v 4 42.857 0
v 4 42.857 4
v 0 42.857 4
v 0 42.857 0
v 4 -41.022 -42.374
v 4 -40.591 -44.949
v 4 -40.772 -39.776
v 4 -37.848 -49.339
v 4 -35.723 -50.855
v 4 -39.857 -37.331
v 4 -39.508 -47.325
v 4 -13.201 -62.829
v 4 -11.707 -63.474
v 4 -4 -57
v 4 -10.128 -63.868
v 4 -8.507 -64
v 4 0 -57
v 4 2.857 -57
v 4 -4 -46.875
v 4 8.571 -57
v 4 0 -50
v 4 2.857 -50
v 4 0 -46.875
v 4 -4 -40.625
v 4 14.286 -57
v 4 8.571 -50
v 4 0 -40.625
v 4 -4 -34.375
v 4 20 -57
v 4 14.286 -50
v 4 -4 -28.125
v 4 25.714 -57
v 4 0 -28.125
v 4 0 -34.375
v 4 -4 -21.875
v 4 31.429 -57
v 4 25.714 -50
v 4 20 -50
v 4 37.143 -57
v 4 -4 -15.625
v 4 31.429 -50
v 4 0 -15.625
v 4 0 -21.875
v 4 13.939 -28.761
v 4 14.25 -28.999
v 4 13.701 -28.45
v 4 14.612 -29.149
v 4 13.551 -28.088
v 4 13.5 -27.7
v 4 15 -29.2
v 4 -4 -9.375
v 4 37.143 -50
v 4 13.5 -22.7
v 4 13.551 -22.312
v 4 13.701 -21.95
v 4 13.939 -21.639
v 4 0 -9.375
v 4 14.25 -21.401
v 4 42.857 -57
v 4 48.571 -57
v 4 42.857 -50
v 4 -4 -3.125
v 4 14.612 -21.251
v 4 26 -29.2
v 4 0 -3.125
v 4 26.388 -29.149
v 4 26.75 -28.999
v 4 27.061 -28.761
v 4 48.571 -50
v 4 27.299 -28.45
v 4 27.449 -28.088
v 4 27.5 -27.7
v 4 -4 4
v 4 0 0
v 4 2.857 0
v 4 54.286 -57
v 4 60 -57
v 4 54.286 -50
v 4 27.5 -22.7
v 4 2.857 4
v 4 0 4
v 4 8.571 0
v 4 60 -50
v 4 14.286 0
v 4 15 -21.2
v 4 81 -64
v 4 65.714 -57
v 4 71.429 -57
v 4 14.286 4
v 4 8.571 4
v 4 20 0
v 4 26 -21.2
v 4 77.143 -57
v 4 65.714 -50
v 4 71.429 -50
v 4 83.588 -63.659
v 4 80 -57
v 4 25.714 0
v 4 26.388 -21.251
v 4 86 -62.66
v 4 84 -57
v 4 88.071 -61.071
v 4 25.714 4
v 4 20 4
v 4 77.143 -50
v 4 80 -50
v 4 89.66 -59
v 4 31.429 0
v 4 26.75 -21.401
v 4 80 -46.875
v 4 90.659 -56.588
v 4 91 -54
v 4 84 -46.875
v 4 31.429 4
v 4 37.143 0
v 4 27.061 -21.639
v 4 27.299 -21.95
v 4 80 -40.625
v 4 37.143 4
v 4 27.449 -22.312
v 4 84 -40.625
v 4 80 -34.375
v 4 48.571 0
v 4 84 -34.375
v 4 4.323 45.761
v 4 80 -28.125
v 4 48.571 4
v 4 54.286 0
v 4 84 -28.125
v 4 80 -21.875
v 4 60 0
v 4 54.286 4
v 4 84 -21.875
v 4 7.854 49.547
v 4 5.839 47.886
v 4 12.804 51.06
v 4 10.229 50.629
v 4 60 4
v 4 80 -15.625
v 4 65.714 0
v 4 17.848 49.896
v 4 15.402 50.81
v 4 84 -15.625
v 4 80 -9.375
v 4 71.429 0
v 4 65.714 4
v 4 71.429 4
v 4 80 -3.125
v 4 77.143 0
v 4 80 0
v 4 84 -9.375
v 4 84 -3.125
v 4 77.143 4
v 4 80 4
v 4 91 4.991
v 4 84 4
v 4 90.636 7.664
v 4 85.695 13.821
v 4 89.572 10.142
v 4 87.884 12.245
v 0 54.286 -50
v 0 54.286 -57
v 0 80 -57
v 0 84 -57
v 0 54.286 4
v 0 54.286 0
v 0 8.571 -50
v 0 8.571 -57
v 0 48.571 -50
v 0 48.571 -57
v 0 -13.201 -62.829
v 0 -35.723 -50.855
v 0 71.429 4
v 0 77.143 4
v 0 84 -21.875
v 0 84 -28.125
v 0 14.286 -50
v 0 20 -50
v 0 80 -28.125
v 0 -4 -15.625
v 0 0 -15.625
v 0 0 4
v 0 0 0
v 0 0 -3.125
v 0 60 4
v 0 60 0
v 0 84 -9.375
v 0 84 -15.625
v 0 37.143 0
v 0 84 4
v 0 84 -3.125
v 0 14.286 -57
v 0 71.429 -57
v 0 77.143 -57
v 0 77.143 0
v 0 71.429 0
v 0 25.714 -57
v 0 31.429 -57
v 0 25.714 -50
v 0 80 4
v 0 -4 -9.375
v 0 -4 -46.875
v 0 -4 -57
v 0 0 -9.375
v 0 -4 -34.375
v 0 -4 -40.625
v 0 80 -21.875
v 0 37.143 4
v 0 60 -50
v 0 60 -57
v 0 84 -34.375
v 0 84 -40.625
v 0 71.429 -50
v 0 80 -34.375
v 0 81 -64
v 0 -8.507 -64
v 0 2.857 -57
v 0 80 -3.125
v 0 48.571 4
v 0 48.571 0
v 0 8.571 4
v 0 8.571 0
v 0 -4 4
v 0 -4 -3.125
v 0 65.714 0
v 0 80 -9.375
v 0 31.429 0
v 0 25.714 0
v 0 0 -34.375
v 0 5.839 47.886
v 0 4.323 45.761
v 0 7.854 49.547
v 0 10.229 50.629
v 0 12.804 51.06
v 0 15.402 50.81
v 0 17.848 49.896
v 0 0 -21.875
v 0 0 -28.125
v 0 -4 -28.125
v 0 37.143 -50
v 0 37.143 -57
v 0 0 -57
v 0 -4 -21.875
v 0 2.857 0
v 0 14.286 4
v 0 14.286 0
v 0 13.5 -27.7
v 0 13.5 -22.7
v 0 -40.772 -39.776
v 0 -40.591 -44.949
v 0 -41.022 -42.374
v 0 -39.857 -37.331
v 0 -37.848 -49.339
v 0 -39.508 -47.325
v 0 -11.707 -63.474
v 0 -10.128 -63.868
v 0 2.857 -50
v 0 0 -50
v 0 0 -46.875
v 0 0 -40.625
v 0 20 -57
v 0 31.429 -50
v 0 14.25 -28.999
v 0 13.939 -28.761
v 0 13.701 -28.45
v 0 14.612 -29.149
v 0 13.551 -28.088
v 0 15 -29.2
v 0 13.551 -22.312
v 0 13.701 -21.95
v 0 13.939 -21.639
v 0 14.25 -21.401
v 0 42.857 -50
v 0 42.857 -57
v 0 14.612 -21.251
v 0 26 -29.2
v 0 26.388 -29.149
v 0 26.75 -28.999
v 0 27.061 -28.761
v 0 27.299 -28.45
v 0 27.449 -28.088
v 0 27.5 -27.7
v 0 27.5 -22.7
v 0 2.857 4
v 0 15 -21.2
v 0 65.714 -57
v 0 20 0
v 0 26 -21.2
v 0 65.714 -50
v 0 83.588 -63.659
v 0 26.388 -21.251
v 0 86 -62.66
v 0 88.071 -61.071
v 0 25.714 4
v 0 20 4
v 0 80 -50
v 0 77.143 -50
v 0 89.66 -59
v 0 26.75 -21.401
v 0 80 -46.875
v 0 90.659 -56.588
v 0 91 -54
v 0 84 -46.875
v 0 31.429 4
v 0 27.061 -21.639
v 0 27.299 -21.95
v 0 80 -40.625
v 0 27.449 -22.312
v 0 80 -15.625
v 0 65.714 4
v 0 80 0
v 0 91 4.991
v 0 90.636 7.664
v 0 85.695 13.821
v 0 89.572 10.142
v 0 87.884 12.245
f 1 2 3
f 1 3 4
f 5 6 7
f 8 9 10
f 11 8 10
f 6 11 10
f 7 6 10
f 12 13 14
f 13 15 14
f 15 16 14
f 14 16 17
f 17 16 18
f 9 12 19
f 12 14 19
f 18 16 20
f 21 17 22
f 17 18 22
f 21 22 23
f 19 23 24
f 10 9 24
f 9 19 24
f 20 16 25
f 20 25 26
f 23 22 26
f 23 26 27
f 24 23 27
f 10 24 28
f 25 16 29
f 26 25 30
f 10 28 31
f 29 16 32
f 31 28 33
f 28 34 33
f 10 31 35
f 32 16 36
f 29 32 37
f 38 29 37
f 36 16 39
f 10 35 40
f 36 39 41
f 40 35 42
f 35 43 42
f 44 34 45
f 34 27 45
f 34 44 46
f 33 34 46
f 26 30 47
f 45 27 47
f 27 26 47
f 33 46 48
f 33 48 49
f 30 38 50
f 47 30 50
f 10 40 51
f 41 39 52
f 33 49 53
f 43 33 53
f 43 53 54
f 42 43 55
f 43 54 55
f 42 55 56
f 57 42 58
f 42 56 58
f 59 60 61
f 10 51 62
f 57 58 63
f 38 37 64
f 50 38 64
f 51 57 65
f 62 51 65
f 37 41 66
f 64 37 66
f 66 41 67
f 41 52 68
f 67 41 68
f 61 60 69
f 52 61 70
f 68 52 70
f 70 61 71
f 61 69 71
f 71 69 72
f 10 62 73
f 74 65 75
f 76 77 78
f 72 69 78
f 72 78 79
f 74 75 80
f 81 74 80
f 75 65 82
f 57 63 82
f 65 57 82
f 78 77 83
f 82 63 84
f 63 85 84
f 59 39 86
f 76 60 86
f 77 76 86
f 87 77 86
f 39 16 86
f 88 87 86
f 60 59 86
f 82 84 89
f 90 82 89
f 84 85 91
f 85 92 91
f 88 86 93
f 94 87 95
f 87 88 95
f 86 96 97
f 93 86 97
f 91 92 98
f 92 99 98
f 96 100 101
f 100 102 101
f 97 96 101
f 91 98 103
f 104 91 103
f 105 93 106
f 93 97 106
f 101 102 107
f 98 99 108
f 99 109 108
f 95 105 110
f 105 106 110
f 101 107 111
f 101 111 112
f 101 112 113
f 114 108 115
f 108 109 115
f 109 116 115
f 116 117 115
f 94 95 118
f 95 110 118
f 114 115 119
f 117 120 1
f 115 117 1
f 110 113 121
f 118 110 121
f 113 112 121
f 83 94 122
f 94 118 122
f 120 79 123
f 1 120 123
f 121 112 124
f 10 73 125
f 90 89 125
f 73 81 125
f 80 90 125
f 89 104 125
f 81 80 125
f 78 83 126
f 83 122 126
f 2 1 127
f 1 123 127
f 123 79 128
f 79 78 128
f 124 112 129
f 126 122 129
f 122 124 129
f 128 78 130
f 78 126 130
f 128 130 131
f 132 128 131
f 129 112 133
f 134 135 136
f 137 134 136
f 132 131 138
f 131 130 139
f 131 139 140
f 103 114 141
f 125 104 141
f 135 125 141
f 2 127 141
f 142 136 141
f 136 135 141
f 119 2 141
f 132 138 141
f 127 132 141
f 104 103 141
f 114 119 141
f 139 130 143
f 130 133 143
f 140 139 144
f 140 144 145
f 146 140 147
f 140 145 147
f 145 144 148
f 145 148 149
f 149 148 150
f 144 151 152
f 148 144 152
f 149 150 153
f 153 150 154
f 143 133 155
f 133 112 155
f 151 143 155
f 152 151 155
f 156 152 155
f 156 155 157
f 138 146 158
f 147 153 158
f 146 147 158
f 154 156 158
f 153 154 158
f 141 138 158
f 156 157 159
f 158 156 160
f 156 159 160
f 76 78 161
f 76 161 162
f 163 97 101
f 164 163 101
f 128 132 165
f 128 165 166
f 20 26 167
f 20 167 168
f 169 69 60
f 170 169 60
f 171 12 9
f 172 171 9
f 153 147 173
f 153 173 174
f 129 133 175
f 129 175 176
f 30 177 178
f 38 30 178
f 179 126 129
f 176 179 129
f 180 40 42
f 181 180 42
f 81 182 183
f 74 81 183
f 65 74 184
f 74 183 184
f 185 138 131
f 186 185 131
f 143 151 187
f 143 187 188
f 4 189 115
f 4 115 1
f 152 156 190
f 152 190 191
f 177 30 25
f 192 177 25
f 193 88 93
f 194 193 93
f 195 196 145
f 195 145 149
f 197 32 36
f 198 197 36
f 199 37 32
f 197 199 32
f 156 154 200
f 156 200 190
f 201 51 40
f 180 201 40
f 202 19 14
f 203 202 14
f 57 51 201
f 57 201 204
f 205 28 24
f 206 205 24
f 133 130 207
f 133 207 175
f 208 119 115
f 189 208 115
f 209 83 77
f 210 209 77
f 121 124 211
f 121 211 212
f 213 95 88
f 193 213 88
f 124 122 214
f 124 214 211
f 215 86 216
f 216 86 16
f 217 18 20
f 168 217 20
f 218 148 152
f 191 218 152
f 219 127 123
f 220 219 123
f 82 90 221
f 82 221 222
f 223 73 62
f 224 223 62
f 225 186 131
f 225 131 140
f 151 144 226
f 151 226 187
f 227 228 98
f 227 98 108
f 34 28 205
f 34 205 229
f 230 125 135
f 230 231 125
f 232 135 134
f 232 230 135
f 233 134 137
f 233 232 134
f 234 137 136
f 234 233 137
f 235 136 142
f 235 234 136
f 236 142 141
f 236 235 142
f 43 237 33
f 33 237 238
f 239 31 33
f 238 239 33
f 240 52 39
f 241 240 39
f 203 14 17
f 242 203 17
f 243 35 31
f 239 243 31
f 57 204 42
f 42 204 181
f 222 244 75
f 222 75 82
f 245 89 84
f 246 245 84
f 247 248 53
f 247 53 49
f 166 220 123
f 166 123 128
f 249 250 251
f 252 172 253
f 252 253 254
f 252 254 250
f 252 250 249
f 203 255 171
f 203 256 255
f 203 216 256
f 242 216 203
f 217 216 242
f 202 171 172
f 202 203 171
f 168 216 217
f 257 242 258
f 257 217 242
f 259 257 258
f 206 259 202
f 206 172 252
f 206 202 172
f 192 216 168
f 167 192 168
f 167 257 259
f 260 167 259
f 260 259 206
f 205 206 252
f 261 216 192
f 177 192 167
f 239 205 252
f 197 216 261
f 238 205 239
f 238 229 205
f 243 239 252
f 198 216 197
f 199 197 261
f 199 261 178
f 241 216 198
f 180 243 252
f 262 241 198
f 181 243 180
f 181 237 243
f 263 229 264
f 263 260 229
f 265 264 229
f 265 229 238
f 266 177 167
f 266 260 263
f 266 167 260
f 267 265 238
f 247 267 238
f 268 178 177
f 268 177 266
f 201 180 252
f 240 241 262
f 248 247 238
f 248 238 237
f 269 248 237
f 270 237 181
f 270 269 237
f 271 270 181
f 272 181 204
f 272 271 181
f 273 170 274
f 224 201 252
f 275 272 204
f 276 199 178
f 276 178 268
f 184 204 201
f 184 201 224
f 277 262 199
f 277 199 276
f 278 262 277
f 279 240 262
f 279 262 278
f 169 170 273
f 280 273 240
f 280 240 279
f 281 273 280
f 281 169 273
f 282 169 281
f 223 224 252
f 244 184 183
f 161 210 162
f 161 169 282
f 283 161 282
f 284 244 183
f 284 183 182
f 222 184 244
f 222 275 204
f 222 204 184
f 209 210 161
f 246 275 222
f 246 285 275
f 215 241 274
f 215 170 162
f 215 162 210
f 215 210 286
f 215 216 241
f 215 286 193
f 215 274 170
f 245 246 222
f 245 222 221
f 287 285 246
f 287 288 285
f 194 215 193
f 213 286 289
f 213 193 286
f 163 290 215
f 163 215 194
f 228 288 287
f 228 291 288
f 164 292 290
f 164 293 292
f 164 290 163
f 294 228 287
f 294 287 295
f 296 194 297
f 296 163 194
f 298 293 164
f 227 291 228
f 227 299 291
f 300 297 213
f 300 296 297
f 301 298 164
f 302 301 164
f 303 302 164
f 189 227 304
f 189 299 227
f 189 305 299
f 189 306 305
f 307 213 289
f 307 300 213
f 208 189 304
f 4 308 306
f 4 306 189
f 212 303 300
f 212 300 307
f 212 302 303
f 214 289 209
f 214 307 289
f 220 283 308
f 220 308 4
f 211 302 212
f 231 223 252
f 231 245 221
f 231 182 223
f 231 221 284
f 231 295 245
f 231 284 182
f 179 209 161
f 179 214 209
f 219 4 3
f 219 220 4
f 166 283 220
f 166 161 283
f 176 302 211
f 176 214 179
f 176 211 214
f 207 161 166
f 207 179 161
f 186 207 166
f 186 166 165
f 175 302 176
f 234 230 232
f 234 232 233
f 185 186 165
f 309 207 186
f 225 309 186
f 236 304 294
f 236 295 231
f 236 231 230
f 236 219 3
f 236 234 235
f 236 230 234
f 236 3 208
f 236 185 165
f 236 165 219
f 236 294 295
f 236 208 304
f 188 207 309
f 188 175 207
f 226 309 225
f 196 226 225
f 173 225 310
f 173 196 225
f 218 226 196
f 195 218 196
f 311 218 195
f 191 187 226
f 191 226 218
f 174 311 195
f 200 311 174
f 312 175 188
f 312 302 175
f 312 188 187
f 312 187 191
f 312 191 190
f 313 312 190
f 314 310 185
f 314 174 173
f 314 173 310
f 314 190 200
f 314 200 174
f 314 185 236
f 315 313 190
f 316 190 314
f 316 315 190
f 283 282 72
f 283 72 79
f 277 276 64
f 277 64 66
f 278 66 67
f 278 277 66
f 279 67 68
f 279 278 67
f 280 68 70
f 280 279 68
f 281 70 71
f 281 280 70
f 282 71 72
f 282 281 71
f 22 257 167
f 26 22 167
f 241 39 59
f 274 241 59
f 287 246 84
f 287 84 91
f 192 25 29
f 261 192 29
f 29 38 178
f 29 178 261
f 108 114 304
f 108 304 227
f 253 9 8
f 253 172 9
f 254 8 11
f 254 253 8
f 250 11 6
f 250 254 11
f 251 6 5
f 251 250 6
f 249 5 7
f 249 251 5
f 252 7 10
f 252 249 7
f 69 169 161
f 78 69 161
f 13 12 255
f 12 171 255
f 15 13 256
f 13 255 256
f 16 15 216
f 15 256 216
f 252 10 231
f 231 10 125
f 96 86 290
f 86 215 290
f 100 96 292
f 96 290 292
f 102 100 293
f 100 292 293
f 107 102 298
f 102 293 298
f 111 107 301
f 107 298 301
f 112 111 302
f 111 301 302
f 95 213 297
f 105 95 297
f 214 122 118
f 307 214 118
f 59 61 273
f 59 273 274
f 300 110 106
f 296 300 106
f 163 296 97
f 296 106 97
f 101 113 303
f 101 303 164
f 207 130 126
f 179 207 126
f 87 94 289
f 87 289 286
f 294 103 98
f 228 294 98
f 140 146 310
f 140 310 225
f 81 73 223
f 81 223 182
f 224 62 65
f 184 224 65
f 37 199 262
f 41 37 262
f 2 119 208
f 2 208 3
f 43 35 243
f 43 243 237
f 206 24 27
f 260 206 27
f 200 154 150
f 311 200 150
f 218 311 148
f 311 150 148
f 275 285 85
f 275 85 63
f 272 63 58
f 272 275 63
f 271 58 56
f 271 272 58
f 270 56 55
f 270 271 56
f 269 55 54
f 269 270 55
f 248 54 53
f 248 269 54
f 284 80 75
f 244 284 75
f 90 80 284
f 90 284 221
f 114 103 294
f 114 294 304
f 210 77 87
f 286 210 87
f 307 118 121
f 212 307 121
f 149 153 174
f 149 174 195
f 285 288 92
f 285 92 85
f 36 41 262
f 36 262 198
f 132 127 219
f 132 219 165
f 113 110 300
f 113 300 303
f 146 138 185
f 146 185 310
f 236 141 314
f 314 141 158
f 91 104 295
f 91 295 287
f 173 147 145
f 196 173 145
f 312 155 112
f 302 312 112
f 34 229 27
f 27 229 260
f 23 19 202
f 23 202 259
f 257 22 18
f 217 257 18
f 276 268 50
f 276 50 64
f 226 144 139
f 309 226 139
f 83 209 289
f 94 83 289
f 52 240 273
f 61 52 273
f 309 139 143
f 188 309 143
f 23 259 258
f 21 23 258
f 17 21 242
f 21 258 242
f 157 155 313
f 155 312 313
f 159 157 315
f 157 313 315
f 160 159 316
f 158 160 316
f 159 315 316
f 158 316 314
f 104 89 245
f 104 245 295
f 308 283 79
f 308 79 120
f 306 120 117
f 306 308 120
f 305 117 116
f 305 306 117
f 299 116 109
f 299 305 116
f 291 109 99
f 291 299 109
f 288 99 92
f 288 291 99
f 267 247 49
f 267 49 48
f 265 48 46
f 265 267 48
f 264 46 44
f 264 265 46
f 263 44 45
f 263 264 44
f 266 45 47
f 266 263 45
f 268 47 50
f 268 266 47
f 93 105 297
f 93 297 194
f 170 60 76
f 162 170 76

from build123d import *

# Parameters (mm, degrees)
SCHIZZO1_W                    = 50
SCHIZZO1_H                    = 80
ESTRUSIONE_ESTRUSIONE1_DEPTH  = 4
SCHIZZO2_W                    = 4
SCHIZZO2_H                    = 2.857142857
SCHIZZO2_W_2                  = 7
ESTRUSIONE_ESTRUSIONE2_DEPTH  = 4
SCHIZZO3_W                    = 4
SCHIZZO3_H                    = 5.714285715
SCHIZZO3_W_2                  = 7
ESTRUSIONE_ESTRUSIONE3_DEPTH  = 4
RIPETIZIONE_A_L1_COUNT        = 6
RIPETIZIONE_A_L1_PITCH        = 11.428571
SCHIZZO4_W                    = 6.25
SCHIZZO4_H                    = 4
ESTRUSIONE_ESTRUSIONE4_DEPTH  = 4
RIPETIZIONE_A_L2_COUNT        = 4
RIPETIZIONE_A_L2_PITCH        = 12.5
SCHIZZO5_W                    = 61
SCHIZZO5_H                    = 88
ESTRUSIONE_ESTRUSIONE5_DEPTH  = 4
RACCORDO1_R                   = 10
TAGLIO_ESTRUSIONE1_DEPTH      = 112.323851892
TAGLIO_ESTRUSIONE1_DEPTH_BACK = 112.323851892
RACCORDO2_R                   = 10


with BuildPart() as part:
    # Schizzo1 → Estrusione-Estrusione1 (new body)
    with BuildSketch(Plane(origin=(0, 0, 0), x_dir=(0, 0, -1), z_dir=(1, 0, 0))):
        with Locations((25, 40)):
            Rectangle(SCHIZZO1_W, SCHIZZO1_H)
    extrude(amount=ESTRUSIONE_ESTRUSIONE1_DEPTH)

    # Schizzo2 → Estrusione-Estrusione2 (add)
    with BuildSketch(Plane(origin=(4, 0, 0), x_dir=(0, 0, -1), z_dir=(1, 0, 0))):
        with Locations((-2, 78.571428572)):
            Rectangle(SCHIZZO2_W, SCHIZZO2_H)
        with Locations((53.5, 78.571428572)):
            Rectangle(SCHIZZO2_W_2, SCHIZZO2_H)
        with Locations((53.5, 1.428571429)):
            Rectangle(SCHIZZO2_W_2, SCHIZZO2_H)
        with Locations((-2, 1.428571429)):
            Rectangle(SCHIZZO2_W, SCHIZZO2_H)
    extrude(amount=-ESTRUSIONE_ESTRUSIONE2_DEPTH)

    # Schizzo3 → Estrusione-Estrusione3 (add)
    with BuildSketch(Plane(origin=(4, 0, 0), x_dir=(0, 0, -1), z_dir=(1, 0, 0))):
        with Locations((-2, 68.571428572)):
            Rectangle(SCHIZZO3_W, SCHIZZO3_H)
        with Locations((53.5, 68.571428572)):
            Rectangle(SCHIZZO3_W_2, SCHIZZO3_H)
    estrusione_estrusione3 = extrude(amount=-ESTRUSIONE_ESTRUSIONE3_DEPTH)

    # Ripetizione a L1: Estrusione-Estrusione3 ×6
    with Locations(*[(0, -i * RIPETIZIONE_A_L1_PITCH, 0) for i in range(1, RIPETIZIONE_A_L1_COUNT)]):
        add(estrusione_estrusione3)

    # Schizzo4 → Estrusione-Estrusione4 (add)
    with BuildSketch(Plane(origin=(4, 0, 0), x_dir=(0, 0, -1), z_dir=(1, 0, 0))):
        with Locations((6.25, 82)):
            Rectangle(SCHIZZO4_W, SCHIZZO4_H)
        with Locations((6.25, -2)):
            Rectangle(SCHIZZO4_W, SCHIZZO4_H)
    estrusione_estrusione4 = extrude(amount=-ESTRUSIONE_ESTRUSIONE4_DEPTH)

    # Ripetizione a L2: Estrusione-Estrusione4 ×4
    with Locations(*[(0, 0, -i * RIPETIZIONE_A_L2_PITCH) for i in range(1, RIPETIZIONE_A_L2_COUNT)]):
        add(estrusione_estrusione4)

    # Schizzo5 → Estrusione-Estrusione5 (add)
    with BuildSketch(Plane(origin=(4, 0, 0), x_dir=(0, 0, -1), z_dir=(1, 0, 0))):
        Polygon((64, -11), (46.160080614, -44.552008529), (-54.590569466, 9.018062365), (-11, 91), (64, 91), align=None)
        with Locations((26.5, 40)):
            Rectangle(SCHIZZO5_W, SCHIZZO5_H, mode=Mode.SUBTRACT)
    extrude(amount=-ESTRUSIONE_ESTRUSIONE5_DEPTH)

    # Raccordo1
    raccordo1_edges = [part.edges().sort_by_distance(p)[0] for p in [
        (2, -44.552008529, -46.160080614),
        (2, 9.018062365, 54.590569466),
    ]]
    fillet(raccordo1_edges, radius=RACCORDO1_R)

    # Schizzo6 → Taglio-Estrusione1 (cut, two sides: drawn at the far end of the back side and taken through both)
    with BuildSketch(Plane(origin=(4, 0, 0), x_dir=(0, 0, -1), z_dir=(1, 0, 0)).offset(-TAGLIO_ESTRUSIONE1_DEPTH_BACK)):
        with BuildLine():
            Line((21.2, 26), (21.2, 15))
            ThreePointArc((21.2, 15), (21.639339828, 13.939339828), (22.7, 13.5))
            Line((22.7, 13.5), (27.7, 13.5))
            ThreePointArc((27.7, 13.5), (28.760660172, 13.939339828), (29.2, 15))
            Line((29.2, 15), (29.2, 26))
            ThreePointArc((29.2, 26), (28.760660172, 27.060660172), (27.7, 27.5))
            Line((27.7, 27.5), (22.7, 27.5))
            ThreePointArc((22.7, 27.5), (21.639339828, 27.060660172), (21.2, 26))
        make_face()
    extrude(amount=TAGLIO_ESTRUSIONE1_DEPTH + TAGLIO_ESTRUSIONE1_DEPTH_BACK, mode=Mode.SUBTRACT)

    # Raccordo2
    raccordo2_edges = [part.edges().sort_by_distance(p)[0] for p in [
        (2, 91, -64),
        (2, -11, -64),
        (2, 91, 11),
    ]]
    fillet(raccordo2_edges, radius=RACCORDO2_R)


solid = part.part
